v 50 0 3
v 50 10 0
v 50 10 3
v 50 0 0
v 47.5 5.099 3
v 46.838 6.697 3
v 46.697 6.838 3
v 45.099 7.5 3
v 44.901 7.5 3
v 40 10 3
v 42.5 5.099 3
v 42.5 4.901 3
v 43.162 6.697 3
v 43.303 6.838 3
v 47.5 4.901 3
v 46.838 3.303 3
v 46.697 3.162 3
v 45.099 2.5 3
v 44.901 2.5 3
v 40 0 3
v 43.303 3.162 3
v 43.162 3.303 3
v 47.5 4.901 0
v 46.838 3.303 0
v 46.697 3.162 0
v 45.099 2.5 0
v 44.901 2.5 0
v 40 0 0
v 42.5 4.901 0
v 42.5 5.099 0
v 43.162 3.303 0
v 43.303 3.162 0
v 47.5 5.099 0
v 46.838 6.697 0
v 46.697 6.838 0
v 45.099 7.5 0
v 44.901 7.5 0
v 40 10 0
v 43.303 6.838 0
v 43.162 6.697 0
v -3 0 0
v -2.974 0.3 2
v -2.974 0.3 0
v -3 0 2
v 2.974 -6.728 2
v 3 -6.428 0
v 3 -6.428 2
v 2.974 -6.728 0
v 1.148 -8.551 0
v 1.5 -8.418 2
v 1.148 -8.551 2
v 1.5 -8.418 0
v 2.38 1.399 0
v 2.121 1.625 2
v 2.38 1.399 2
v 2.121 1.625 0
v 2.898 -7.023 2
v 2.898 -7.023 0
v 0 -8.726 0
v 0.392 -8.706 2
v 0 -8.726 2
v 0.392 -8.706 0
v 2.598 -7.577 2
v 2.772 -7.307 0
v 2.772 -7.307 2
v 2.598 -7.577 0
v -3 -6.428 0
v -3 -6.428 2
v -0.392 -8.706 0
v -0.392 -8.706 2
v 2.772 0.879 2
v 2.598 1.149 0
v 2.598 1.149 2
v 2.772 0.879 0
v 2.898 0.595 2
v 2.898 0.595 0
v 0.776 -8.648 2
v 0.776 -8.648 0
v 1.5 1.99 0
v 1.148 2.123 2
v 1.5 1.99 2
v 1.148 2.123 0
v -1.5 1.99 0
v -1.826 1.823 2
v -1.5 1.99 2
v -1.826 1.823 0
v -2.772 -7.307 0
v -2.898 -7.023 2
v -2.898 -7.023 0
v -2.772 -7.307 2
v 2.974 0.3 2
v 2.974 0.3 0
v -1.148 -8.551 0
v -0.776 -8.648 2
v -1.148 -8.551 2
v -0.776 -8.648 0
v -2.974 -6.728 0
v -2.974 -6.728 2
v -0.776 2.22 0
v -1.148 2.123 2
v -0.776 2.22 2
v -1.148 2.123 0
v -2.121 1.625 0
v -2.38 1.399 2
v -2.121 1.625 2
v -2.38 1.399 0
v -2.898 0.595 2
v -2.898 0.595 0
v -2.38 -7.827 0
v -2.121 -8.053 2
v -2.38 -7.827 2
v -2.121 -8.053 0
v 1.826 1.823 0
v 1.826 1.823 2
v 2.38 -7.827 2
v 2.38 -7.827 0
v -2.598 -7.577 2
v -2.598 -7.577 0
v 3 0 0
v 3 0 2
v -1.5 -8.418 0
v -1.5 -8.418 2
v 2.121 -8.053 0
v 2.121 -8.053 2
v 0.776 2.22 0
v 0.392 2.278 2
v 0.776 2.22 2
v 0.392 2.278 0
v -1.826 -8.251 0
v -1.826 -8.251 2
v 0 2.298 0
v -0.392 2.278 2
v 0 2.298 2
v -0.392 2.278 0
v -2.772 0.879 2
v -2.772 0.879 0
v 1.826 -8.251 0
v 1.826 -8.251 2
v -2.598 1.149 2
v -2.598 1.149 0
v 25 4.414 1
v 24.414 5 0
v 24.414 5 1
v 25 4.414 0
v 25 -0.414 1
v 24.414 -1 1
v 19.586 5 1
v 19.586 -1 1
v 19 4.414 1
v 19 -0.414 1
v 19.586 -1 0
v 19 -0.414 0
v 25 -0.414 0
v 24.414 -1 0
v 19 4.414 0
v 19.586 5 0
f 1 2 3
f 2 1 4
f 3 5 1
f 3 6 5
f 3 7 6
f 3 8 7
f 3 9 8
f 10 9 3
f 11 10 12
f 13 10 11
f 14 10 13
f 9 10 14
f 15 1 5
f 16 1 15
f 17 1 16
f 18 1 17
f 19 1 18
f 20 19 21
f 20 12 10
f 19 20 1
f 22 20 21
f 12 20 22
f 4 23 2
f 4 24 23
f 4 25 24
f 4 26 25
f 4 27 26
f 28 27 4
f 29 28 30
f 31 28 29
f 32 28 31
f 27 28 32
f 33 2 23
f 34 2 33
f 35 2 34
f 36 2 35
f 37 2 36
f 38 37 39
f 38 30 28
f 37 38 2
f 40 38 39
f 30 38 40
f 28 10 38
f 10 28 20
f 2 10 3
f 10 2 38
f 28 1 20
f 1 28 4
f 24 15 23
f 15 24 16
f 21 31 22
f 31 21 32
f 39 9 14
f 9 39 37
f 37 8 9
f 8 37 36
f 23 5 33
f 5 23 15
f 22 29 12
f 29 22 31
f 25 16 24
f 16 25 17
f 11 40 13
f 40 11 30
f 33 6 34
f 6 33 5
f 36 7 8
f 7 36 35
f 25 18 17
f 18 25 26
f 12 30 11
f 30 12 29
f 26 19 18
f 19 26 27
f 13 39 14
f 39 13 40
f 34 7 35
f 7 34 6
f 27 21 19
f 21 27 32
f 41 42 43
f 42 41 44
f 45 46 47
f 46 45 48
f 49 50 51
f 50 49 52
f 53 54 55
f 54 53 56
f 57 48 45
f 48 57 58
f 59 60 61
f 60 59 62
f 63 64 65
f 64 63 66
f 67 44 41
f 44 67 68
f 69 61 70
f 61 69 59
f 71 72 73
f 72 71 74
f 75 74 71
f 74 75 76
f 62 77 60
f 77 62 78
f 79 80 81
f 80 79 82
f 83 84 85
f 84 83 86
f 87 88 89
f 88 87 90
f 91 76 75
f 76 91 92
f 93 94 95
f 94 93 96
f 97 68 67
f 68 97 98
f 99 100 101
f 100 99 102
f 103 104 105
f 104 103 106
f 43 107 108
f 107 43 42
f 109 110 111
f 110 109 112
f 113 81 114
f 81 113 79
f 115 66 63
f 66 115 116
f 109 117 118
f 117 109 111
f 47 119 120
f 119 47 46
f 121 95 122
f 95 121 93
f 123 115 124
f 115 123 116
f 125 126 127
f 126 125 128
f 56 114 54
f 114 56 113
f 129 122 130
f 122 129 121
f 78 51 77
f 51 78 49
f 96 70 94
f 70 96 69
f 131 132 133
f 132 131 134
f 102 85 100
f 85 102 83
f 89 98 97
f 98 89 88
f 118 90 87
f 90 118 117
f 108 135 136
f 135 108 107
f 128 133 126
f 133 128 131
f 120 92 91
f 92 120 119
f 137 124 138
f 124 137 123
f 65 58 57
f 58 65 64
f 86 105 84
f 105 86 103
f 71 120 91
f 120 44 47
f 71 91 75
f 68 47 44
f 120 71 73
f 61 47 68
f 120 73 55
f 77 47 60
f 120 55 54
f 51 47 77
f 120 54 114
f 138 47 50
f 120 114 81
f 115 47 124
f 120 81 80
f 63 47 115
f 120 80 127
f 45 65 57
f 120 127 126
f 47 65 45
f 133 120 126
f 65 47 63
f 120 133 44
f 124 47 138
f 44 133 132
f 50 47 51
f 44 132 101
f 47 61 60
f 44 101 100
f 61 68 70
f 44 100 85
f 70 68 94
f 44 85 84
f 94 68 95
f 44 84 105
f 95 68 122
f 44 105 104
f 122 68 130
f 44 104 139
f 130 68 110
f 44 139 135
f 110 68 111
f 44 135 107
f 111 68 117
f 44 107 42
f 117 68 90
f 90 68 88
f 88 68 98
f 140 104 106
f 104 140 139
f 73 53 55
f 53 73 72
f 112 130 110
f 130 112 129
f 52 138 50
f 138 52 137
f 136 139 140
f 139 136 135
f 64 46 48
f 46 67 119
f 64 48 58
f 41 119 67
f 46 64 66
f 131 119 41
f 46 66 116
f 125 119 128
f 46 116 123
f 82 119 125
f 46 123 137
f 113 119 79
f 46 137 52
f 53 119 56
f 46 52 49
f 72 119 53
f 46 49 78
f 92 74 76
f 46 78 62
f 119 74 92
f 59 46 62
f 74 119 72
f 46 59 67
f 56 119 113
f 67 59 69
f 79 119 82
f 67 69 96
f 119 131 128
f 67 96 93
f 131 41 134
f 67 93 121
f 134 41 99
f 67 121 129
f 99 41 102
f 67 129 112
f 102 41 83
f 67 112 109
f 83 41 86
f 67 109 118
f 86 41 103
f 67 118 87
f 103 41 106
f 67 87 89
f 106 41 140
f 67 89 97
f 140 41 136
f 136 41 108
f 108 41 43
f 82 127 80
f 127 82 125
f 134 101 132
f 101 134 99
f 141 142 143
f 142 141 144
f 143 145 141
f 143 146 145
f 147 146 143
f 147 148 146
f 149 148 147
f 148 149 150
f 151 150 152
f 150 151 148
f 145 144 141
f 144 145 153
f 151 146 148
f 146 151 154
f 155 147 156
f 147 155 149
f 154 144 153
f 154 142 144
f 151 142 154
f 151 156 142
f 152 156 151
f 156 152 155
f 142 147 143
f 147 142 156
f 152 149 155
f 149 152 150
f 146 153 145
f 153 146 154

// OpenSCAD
// Mesh fallback: nodes with no exact counterpart are built from OpenSCAD's own render (facets, with a warning)
// explicit $fn: the fallback embeds OpenSCAD's render as authored, and the fixture oracle's -D $fa/$fs cannot refine it
linear_extrude(height = 2) projection() rotate([40, 0, 0]) cylinder(h = 10, r = 3, $fn = 48);
translate([20, 0, 0]) linear_extrude(height = 1) offset(delta = 1, chamfer = true) square(4);
translate([40, 0, 0]) difference() {
  cube([10, 10, 3]);
  translate([5, 5, -1]) linear_extrude(height = 5) offset(delta = 0.5, chamfer = true) circle(r = 2, $fn = 8);
}
